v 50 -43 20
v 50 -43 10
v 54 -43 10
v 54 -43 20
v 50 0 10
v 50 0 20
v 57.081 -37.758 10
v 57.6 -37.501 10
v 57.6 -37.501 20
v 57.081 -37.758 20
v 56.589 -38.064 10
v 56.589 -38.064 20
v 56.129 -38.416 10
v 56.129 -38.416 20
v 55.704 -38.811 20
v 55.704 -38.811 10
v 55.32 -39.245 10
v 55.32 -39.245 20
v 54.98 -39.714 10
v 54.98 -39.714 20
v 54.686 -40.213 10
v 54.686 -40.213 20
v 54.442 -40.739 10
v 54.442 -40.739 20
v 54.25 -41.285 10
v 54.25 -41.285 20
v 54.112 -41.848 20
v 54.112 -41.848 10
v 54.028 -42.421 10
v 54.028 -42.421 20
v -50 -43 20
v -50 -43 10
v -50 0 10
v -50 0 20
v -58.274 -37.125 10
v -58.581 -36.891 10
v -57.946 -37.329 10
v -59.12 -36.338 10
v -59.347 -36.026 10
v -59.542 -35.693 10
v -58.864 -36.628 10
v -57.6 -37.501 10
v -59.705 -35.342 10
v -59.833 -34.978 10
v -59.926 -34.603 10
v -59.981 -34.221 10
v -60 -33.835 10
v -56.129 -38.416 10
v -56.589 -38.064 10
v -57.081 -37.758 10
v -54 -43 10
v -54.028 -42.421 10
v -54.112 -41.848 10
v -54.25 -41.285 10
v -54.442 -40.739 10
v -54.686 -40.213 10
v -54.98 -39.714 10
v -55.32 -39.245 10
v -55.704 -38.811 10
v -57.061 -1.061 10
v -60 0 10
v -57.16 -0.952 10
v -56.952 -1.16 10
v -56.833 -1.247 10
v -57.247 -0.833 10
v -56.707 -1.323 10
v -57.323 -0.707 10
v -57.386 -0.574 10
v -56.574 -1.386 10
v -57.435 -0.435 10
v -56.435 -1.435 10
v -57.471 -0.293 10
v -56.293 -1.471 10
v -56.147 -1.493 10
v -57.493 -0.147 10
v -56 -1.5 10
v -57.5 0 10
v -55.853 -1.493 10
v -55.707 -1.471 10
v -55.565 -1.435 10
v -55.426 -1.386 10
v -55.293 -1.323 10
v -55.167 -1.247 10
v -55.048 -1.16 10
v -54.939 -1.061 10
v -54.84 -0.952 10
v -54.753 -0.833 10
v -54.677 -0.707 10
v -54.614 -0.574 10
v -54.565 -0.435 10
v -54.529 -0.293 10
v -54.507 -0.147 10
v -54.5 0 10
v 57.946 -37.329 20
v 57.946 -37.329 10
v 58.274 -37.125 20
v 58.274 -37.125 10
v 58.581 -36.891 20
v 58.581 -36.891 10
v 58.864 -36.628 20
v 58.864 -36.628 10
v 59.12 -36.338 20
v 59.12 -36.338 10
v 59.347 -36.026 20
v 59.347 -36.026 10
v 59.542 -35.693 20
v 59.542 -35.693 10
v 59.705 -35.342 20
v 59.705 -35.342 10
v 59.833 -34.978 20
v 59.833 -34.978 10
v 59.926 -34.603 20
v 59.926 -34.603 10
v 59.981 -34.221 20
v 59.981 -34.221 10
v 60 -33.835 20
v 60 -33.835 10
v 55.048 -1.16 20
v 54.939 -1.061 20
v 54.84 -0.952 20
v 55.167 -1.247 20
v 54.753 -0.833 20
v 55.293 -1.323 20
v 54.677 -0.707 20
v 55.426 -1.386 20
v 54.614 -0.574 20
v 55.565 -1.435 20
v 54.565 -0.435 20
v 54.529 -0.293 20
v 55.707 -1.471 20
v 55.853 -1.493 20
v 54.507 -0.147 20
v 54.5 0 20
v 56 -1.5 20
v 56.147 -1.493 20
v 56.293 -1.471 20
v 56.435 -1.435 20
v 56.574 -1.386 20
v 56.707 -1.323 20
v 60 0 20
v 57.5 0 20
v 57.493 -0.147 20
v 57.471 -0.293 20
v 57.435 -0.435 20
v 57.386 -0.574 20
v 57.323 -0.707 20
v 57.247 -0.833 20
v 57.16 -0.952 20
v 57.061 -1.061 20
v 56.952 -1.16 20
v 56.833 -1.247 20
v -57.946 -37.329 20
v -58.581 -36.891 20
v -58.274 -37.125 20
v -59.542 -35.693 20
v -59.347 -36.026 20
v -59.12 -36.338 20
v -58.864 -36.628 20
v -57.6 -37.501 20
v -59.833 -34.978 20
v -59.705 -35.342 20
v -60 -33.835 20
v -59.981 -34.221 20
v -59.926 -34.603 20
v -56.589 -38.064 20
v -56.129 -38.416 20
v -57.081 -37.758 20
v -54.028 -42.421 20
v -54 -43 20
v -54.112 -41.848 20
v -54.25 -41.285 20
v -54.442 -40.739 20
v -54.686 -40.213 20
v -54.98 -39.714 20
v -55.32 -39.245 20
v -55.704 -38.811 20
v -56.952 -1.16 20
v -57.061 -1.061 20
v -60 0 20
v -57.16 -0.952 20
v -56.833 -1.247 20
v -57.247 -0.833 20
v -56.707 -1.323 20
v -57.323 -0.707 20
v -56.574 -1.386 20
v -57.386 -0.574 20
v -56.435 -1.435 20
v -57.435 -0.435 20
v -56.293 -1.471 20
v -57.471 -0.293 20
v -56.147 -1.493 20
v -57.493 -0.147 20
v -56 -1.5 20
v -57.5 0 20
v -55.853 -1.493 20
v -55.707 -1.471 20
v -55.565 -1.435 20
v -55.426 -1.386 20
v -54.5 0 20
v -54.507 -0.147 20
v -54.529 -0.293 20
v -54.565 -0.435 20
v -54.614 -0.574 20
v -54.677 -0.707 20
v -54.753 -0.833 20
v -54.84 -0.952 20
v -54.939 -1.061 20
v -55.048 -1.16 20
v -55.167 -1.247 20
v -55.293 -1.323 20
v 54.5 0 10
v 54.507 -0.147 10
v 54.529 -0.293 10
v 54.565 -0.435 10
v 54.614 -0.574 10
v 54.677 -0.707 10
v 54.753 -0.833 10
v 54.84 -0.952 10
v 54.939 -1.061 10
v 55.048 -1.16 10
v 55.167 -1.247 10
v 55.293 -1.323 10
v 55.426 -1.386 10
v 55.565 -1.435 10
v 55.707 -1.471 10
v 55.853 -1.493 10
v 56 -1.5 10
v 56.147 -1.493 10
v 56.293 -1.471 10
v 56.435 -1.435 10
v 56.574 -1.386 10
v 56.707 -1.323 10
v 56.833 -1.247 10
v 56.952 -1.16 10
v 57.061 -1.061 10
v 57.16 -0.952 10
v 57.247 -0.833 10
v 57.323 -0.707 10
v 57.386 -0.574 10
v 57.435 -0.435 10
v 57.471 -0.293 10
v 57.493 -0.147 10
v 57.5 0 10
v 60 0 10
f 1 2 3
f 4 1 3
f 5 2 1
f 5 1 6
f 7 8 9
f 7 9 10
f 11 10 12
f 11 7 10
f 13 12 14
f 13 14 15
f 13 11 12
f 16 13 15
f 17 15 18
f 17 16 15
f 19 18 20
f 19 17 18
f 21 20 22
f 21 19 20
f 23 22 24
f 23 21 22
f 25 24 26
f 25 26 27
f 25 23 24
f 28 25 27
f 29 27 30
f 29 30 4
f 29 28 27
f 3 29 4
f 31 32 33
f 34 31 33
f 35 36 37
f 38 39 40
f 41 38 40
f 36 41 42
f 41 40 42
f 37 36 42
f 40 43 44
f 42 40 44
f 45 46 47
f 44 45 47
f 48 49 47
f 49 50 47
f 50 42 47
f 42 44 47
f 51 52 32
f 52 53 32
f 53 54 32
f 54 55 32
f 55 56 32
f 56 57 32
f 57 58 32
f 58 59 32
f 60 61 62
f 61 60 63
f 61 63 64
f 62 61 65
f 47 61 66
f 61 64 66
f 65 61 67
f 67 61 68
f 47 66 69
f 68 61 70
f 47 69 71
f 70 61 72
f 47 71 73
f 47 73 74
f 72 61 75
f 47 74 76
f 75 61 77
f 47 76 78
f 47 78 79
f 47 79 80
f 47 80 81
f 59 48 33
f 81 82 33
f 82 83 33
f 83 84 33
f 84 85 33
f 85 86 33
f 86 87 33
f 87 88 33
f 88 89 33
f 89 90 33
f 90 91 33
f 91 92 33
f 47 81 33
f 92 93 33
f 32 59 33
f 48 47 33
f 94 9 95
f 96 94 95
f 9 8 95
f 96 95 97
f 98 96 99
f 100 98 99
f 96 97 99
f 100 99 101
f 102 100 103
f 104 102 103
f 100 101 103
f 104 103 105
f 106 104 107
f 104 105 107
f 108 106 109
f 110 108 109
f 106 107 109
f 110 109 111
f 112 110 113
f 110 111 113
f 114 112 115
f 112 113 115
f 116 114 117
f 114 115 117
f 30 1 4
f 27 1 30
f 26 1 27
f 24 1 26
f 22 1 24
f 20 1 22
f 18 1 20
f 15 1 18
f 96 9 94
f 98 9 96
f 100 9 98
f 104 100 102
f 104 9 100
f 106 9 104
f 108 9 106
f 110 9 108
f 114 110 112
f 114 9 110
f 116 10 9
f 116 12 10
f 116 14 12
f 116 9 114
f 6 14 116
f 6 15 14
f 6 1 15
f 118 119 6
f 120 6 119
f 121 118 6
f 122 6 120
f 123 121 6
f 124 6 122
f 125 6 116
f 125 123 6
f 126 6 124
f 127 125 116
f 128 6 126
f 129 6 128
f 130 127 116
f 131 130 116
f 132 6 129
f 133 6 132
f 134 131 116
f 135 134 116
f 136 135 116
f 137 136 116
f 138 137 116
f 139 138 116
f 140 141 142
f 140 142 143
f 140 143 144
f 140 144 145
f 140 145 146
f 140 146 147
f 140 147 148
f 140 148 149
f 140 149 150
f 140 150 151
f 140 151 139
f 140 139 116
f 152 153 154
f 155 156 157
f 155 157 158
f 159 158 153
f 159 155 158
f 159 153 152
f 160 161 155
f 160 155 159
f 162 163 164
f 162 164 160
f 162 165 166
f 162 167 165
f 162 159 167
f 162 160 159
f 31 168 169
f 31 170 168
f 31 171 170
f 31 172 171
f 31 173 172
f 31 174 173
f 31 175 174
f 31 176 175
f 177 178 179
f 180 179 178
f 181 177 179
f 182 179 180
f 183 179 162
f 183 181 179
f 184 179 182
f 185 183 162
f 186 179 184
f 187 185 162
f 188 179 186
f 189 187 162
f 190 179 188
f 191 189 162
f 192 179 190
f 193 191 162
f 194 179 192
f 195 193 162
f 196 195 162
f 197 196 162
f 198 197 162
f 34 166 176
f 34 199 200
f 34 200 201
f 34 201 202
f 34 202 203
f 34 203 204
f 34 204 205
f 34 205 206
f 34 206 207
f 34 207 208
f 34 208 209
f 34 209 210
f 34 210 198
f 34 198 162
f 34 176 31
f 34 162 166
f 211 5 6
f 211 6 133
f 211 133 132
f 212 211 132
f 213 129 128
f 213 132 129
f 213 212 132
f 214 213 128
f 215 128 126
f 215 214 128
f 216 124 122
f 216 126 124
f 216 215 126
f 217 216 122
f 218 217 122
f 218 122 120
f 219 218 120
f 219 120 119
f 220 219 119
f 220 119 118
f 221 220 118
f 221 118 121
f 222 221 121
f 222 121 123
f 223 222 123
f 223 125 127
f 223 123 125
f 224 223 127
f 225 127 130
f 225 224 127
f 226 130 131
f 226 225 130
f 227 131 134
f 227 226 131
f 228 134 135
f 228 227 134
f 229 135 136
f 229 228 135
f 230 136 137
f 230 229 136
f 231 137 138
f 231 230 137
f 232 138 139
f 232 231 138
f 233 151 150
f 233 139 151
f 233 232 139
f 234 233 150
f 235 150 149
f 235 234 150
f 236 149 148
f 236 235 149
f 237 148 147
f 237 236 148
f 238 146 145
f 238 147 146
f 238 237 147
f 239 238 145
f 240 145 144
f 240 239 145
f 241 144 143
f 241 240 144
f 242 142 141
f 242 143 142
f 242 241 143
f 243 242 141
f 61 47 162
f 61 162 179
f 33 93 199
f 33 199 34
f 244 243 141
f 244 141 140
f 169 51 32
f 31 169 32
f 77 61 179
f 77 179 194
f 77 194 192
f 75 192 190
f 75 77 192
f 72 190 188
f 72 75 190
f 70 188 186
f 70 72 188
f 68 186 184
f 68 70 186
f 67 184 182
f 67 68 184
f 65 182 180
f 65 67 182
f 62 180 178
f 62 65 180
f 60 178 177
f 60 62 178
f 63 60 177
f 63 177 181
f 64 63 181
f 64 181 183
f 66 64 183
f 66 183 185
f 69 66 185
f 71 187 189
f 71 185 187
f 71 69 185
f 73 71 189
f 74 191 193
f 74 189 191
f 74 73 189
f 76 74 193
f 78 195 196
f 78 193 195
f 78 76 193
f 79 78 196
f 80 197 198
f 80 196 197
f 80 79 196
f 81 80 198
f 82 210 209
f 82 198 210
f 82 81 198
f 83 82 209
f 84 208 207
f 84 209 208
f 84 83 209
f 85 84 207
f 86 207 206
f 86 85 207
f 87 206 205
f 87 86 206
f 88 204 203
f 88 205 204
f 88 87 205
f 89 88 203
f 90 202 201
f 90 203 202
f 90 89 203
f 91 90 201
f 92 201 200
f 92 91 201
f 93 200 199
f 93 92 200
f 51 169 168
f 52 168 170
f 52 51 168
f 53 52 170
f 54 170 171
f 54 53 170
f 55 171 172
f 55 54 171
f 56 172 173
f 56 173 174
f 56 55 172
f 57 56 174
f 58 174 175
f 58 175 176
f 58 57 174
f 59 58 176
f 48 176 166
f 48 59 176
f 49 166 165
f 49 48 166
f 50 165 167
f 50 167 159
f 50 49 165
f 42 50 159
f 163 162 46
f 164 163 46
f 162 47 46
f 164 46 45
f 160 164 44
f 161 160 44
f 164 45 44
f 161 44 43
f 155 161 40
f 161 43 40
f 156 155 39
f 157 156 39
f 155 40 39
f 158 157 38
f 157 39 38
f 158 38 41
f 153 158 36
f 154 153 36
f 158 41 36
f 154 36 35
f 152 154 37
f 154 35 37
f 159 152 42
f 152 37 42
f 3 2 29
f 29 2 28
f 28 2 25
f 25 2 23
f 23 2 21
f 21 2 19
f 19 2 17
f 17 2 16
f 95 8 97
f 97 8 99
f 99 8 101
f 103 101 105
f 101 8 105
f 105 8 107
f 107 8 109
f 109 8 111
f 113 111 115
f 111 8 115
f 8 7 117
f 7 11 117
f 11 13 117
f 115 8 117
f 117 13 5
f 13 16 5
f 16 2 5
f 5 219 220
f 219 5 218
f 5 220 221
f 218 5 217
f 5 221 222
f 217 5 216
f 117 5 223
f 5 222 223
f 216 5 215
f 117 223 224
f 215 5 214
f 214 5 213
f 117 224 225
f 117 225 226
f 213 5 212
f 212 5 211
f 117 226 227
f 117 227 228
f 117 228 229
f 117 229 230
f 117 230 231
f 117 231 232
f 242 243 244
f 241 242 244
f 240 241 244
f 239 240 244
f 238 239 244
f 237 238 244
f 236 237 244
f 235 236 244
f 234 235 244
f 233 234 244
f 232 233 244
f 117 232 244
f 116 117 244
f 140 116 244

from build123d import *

# Parameters (mm, degrees)
CYLINDER526_R               = 6
CYLINDER526_DEPTH           = 10
CYLINDER522_R               = 6
CYLINDER522_DEPTH           = 10
CYLINDER524_R               = 1.5
CYLINDER524_DEPTH           = 20
CYLINDER524_PLACEMENT_ANGLE = 45
CYLINDER521_R               = 1.5
CYLINDER521_DEPTH           = 20
CYLINDER523_R               = 1.5
CYLINDER523_DEPTH           = 20
CYLINDER523_PLACEMENT_ANGLE = 135
CYLINDER527_R               = 1.5
CYLINDER527_DEPTH           = 20
CYLINDER520_R               = 1.5
CYLINDER520_DEPTH           = 20
CYLINDER520_PLACEMENT_ANGLE = 225
CYLINDER525_R               = 1.5
CYLINDER525_DEPTH           = 20
CYLINDER518_R               = 1.5
CYLINDER518_DEPTH           = 20
CYLINDER518_PLACEMENT_ANGLE = 45
CYLINDER519_R               = 1.5
CYLINDER519_DEPTH           = 20
BOX108_W                    = 10
BOX108_H                    = 43
BOX108_DEPTH                = 10
BOX109_W                    = 10
BOX109_H                    = 43
BOX109_DEPTH                = 10
FILLET002_R                 = 4


with BuildPart() as v_lec526:
    # Cylinder526 → Cylinder526 (new body)
    with BuildSketch(Plane(origin=(-60, -43, 10), x_dir=(1, 0, 0), z_dir=(0, 0, 1))):
        Circle(CYLINDER526_R)
    extrude(amount=CYLINDER526_DEPTH)


with BuildPart() as compound241:
    # Cylinder522 → Cylinder522 (new body)
    with BuildSketch(Plane(origin=(60, -43, 10), x_dir=(1, 0, 0), z_dir=(0, 0, 1))):
        Circle(CYLINDER522_R)
    extrude(amount=CYLINDER522_DEPTH)

    # Compound241: union Válec526
    add(v_lec526.part)


with BuildPart() as v_lec524:
    # Cylinder524 → Cylinder524 (new body)
    with BuildSketch(Plane.XY):
        Circle(CYLINDER524_R)
    extrude(amount=CYLINDER524_DEPTH)


with BuildPart() as v_lec524_1:
    # Cylinder524 placement: moved
    add(v_lec524.part.moved(Location((39.59798, -39.59798, 2))).rotate(Axis((39.59798, -39.59798, 2), (0, 0, 1)), CYLINDER524_PLACEMENT_ANGLE))


with BuildPart() as v_lec521:
    # Cylinder521 → Cylinder521 (new body)
    with BuildSketch(Plane(origin=(56, 0, 2), x_dir=(0, 1, 0), z_dir=(0, 0, 1))):
        Circle(CYLINDER521_R)
    extrude(amount=CYLINDER521_DEPTH)


with BuildPart() as v_lec523:
    # Cylinder523 → Cylinder523 (new body)
    with BuildSketch(Plane.XY):
        Circle(CYLINDER523_R)
    extrude(amount=CYLINDER523_DEPTH)


with BuildPart() as v_lec523_1:
    # Cylinder523 placement: moved
    add(v_lec523.part.moved(Location((39.59798, 39.59798, 2))).rotate(Axis((39.59798, 39.59798, 2), (0, 0, 1)), CYLINDER523_PLACEMENT_ANGLE))


with BuildPart() as v_lec527:
    # Cylinder527 → Cylinder527 (new body)
    with BuildSketch(Plane(origin=(0, 56, 2), x_dir=(-1, 0, 0), z_dir=(0, 0, 1))):
        Circle(CYLINDER527_R)
    extrude(amount=CYLINDER527_DEPTH)


with BuildPart() as v_lec520:
    # Cylinder520 → Cylinder520 (new body)
    with BuildSketch(Plane.XY):
        Circle(CYLINDER520_R)
    extrude(amount=CYLINDER520_DEPTH)


with BuildPart() as v_lec520_1:
    # Cylinder520 placement: moved
    add(v_lec520.part.moved(Location((-39.59798, 39.59798, 2))).rotate(Axis((-39.59798, 39.59798, 2), (0, 0, 1)), CYLINDER520_PLACEMENT_ANGLE))


with BuildPart() as v_lec525:
    # Cylinder525 → Cylinder525 (new body)
    with BuildSketch(Plane(origin=(-56, 0, 2), x_dir=(0, -1, 0), z_dir=(0, 0, 1))):
        Circle(CYLINDER525_R)
    extrude(amount=CYLINDER525_DEPTH)


with BuildPart() as v_lec518:
    # Cylinder518 → Cylinder518 (new body)
    with BuildSketch(Plane.XY):
        Circle(CYLINDER518_R)
    extrude(amount=CYLINDER518_DEPTH)


with BuildPart() as v_lec518_1:
    # Cylinder518 placement: moved
    add(v_lec518.part.moved(Location((-39.59798, -39.59798, 2))).rotate(Axis((-39.59798, -39.59798, 2), (0, 0, -1)), CYLINDER518_PLACEMENT_ANGLE))


with BuildPart() as compound240:
    # Cylinder519 → Cylinder519 (new body)
    with BuildSketch(Plane(origin=(0, -56, 2), x_dir=(1, 0, 0), z_dir=(0, 0, 1))):
        Circle(CYLINDER519_R)
    extrude(amount=CYLINDER519_DEPTH)

    # Compound240: union Válec524, Válec521, Válec523, Válec527, Válec520, Válec525, Válec518
    add(v_lec524_1.part)
    add(v_lec521.part)
    add(v_lec523_1.part)
    add(v_lec527.part)
    add(v_lec520_1.part)
    add(v_lec525.part)
    add(v_lec518_1.part)


with BuildPart() as krychle108:
    # Box108 → Box108 (new body)
    with BuildSketch(Plane(origin=(50, -43, 10), x_dir=(1, 0, 0), z_dir=(0, 0, 1))):
        with Locations((5, 21.5)):
            Rectangle(BOX108_W, BOX108_H)
    extrude(amount=BOX108_DEPTH)


with BuildPart() as fillet002:
    # Box109 → Box109 (new body)
    with BuildSketch(Plane(origin=(-60, -43, 10), x_dir=(1, 0, 0), z_dir=(0, 0, 1))):
        with Locations((5, 21.5)):
            Rectangle(BOX109_W, BOX109_H)
    extrude(amount=BOX109_DEPTH)

    # Compound239: union Krychle108
    add(krychle108.part)

    # Cut206: cut Compound240
    add(compound240.part, mode=Mode.SUBTRACT)

    # Cut207: cut Compound241
    add(compound241.part, mode=Mode.SUBTRACT)

    # Fillet002
    fillet002_edges = [fillet002.edges().sort_by_distance(p)[0] for p in [
        (-60, -37, 15),
        (60, -37, 15),
    ]]
    fillet(fillet002_edges, radius=FILLET002_R)


solid = fillet002.part
